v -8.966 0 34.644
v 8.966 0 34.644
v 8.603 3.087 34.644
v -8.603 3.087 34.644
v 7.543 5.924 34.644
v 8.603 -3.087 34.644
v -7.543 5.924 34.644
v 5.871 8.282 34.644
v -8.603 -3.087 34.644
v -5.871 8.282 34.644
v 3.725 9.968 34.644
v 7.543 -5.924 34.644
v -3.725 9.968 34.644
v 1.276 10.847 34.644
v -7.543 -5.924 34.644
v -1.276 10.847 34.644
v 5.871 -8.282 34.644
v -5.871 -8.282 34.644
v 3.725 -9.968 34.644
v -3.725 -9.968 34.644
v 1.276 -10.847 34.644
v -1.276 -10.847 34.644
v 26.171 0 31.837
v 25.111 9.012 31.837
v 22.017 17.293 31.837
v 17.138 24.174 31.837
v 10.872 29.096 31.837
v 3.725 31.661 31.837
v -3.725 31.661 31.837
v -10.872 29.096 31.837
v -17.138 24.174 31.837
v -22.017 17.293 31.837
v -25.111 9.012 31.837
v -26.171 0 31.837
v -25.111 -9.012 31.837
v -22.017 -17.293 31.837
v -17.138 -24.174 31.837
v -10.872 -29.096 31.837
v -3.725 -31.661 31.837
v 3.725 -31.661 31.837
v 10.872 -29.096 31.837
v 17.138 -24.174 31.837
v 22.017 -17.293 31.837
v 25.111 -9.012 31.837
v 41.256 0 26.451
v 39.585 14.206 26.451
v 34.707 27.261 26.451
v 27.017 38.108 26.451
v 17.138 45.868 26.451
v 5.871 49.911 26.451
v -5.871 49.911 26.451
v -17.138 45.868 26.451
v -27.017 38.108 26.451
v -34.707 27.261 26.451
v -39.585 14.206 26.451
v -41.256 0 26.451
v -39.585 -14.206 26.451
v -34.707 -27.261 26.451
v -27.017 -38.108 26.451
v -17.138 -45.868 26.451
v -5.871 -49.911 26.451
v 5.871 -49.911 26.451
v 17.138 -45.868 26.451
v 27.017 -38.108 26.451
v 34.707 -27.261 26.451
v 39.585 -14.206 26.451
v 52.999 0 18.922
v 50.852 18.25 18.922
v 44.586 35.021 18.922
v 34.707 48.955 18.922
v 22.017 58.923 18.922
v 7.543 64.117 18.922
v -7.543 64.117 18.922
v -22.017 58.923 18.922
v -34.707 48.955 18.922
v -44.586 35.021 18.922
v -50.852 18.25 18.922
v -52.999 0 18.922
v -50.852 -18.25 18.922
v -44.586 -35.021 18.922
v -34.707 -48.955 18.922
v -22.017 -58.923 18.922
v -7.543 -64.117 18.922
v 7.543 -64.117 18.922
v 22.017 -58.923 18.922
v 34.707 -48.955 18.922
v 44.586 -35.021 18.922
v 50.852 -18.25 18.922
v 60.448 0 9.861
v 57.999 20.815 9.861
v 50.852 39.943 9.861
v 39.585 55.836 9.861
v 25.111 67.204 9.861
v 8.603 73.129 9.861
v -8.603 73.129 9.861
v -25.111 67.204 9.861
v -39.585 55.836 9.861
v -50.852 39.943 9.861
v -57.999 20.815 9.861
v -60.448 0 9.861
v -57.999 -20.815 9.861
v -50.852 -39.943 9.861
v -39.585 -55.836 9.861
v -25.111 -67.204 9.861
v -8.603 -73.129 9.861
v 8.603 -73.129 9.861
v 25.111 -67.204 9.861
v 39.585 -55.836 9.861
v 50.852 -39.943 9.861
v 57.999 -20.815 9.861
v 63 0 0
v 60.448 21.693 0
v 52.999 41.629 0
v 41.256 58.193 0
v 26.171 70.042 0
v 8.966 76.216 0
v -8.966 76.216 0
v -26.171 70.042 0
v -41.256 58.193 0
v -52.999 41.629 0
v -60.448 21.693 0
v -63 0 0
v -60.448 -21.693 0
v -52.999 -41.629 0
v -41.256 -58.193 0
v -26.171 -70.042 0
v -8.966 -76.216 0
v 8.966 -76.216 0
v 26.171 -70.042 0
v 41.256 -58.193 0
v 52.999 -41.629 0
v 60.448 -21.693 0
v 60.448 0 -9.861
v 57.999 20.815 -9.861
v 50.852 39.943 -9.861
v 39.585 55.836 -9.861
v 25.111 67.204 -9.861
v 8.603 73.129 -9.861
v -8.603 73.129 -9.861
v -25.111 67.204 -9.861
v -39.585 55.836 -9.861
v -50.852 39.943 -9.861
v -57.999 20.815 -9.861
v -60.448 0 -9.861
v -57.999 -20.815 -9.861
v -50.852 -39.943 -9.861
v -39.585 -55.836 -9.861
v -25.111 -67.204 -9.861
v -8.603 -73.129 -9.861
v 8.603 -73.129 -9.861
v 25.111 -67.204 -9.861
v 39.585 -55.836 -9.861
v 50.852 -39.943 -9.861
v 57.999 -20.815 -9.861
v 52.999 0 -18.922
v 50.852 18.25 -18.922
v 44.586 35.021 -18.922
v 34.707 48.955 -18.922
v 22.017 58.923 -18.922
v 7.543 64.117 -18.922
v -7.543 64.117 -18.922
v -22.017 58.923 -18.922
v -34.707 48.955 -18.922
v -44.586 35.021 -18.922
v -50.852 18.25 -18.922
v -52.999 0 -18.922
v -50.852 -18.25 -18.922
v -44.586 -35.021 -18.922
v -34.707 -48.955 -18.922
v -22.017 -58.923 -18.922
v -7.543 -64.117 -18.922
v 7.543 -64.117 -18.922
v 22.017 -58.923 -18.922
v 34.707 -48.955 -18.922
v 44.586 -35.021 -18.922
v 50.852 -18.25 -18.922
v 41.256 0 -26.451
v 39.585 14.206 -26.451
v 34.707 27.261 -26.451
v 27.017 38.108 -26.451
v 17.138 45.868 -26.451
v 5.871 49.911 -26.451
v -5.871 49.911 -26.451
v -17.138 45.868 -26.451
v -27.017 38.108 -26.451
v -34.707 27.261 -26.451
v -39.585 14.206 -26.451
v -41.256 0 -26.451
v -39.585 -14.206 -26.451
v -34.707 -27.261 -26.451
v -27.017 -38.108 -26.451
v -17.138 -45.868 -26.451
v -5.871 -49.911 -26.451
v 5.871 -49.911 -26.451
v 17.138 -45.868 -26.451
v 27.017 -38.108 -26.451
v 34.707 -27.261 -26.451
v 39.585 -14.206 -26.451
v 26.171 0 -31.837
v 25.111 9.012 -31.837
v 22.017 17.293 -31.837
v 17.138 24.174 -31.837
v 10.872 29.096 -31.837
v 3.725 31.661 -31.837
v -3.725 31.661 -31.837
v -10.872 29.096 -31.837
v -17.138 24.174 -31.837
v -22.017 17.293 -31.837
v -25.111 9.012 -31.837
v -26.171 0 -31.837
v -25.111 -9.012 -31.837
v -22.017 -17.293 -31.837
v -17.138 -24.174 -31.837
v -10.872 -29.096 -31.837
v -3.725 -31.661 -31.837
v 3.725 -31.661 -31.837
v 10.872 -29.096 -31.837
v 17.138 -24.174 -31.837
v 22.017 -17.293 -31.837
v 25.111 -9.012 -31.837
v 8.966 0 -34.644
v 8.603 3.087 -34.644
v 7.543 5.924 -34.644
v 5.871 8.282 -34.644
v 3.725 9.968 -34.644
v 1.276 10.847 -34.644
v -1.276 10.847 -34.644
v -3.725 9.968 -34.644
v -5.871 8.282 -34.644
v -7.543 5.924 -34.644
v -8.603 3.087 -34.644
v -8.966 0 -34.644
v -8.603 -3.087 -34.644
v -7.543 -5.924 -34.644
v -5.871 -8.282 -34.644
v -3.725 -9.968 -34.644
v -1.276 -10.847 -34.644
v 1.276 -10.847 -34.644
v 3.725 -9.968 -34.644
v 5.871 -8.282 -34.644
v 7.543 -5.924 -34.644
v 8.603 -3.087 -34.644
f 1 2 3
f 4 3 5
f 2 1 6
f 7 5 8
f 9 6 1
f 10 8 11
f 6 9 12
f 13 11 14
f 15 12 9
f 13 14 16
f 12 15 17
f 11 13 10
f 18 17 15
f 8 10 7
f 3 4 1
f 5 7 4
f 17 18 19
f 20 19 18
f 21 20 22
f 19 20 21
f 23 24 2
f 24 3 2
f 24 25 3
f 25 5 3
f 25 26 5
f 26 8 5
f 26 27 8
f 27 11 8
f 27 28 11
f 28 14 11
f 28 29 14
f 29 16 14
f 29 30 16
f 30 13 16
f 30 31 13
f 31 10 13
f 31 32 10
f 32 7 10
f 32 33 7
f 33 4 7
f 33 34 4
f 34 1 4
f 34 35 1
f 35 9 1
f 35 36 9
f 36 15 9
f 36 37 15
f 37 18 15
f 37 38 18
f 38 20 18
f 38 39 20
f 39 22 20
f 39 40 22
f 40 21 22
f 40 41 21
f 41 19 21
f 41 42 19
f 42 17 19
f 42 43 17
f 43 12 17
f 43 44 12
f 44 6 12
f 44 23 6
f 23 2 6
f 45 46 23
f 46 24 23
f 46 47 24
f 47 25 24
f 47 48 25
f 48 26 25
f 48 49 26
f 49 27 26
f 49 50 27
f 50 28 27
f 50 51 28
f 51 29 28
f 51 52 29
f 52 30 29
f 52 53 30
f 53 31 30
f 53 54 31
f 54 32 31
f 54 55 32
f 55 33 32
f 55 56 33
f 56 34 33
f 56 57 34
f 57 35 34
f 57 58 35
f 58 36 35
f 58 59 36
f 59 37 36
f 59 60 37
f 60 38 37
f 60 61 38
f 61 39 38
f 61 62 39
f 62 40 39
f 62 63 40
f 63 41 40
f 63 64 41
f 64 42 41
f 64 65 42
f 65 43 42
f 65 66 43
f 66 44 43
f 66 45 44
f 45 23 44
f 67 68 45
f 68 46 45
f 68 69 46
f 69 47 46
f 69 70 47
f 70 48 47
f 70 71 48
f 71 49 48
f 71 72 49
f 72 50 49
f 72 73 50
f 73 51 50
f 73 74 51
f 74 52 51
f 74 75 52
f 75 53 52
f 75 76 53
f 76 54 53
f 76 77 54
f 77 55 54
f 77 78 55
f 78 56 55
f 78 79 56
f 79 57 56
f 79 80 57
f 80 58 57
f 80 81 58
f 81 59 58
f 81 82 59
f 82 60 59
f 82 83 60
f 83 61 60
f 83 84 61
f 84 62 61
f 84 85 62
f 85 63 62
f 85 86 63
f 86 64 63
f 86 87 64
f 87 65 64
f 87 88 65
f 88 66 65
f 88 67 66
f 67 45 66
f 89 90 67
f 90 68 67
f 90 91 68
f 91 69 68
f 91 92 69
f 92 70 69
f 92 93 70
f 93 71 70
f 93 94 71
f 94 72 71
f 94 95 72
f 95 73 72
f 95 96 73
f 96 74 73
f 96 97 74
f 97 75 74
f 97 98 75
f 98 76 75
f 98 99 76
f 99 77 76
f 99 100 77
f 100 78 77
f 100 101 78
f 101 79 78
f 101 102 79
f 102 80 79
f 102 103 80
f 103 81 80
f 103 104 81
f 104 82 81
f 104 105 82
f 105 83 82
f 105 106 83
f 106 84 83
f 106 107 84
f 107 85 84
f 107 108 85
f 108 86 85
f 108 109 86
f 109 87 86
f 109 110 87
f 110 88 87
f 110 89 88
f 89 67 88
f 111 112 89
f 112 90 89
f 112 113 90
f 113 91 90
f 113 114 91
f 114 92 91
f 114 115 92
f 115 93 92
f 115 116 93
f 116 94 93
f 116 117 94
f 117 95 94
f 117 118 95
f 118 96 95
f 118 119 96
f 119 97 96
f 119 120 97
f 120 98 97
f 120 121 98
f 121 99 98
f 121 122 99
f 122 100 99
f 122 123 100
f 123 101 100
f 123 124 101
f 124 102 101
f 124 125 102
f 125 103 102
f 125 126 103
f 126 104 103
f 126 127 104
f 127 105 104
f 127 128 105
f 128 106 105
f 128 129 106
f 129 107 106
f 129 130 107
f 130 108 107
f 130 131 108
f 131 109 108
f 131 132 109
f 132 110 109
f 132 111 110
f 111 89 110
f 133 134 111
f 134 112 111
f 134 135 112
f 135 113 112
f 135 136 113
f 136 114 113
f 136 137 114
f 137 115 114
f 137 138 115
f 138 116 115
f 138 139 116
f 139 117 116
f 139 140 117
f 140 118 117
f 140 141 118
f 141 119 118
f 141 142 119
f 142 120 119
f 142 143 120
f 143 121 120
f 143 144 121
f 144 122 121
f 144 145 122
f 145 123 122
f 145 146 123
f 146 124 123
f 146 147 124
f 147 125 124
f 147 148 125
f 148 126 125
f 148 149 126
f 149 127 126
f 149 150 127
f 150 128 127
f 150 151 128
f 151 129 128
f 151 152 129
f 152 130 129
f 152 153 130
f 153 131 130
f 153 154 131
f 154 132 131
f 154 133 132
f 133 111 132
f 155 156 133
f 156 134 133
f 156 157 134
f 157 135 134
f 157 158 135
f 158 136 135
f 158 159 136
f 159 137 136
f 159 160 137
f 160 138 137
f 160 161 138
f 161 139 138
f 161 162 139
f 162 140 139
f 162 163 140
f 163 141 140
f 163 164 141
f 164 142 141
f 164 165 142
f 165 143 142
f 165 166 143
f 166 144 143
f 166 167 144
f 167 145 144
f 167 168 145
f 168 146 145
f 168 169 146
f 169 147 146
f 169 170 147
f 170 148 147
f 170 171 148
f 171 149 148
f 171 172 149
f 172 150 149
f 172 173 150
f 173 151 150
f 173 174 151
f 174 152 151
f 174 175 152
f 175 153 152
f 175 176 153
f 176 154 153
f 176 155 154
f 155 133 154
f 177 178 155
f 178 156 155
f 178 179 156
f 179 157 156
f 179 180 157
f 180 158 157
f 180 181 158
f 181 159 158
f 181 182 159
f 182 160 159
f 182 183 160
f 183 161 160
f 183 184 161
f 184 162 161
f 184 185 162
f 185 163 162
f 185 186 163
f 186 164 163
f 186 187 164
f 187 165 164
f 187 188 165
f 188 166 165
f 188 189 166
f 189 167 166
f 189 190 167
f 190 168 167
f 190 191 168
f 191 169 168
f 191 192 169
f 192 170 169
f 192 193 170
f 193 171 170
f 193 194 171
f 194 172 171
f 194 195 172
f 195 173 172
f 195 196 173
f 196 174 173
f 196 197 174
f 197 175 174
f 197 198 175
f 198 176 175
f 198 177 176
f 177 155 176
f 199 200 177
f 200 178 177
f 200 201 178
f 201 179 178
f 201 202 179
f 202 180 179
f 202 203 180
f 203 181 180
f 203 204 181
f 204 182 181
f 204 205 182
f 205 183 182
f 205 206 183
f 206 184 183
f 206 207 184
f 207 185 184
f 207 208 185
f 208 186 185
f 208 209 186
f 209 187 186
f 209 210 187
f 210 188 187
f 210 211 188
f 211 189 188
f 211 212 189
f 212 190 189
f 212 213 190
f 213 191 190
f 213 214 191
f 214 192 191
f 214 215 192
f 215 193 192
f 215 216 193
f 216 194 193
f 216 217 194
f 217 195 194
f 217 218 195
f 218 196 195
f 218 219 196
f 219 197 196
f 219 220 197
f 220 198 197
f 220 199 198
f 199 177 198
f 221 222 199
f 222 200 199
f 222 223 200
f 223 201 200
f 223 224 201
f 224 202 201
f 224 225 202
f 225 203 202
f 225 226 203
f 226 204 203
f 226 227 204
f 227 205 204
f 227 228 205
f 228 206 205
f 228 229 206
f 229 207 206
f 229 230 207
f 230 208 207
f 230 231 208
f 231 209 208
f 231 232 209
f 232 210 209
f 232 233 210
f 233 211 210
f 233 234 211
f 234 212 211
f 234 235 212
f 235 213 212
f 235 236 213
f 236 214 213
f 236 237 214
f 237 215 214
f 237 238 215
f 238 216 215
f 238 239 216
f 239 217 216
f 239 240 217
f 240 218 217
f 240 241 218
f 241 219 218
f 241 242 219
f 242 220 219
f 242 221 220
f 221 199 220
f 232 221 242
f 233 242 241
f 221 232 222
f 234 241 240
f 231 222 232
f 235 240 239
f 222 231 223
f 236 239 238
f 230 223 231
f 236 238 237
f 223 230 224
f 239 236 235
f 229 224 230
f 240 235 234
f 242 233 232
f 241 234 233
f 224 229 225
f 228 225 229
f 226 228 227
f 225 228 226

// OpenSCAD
// Generated by SolidPython 1.0.1 on 2020-07-29 00:46:48


scale(v = [9, 11, 5]) {
	sphere(r = 7);
}
/***********************************************
*********      SolidPython code:      **********
************************************************
 
# import packages: SolidPython
from solid import *
from solid.utils import *
from itertools import chain, combinations, permutations


class Resize:

    def __init__(self, scad_file):
        self.scad_file = scad_file
        #self.scad_file = import_scad(scad_file)
        # cone/cylinder param:
        self.r1 = 0
        self.r2 = 0
        self.h = 0
        # rectangular prism param:
        self.w = 0
        self.l = 0
        # ellipse param:
        self.r = 0

    # import OpenScad code (file name corresponds to shape)


    # classify shape + parameters
    def assign(self, param1, param2, param3):
        if self.scad_file == 'cone.scad':
            self.r1 = param1
            self.r2 = param2
            self.h = param3
        elif self.scad_file == 'cylinder.scad':
            self.r1 = param1
            self.r2 = param2
            self.h = param3
        elif self.scad_file == 'rectangularPrism.scad':
            self.h = param1
            self.l = param2
            self.w = param3
        else:
            self.r = param1
            self.h = param2

    # resize parameters
    def iterate(self):
        x = range(3, 20, 2)
        i = 1
        if self.scad_file == 'cone.scad':
            tempList = list(permutations(x, 2))
            for temp in tempList:
                param1 = temp[0]
                param2 = temp[1]
                filepath = 'produced_scad_files/' + 'cone' + str(param1) + '_' + str(param2) + '_' + '.scad'
                scad_render_to_file(cylinder(h=param1, r1=param2, r2=0), filepath)

        elif self.scad_file == 'cylinder.scad':
            tempList = list(permutations(x, 3))
            for temp in tempList:
                param1 = temp[0]
                param2 = temp[1]
                filepath = 'produced_scad_files/' + 'cylinder' + str(param1) + '_' + str(param2) + '_' + '.scad'
                scad_render_to_file(cylinder(h=param1, r1=param2, r2=param2), filepath)

        elif self.scad_file == 'rectangularPrism.scad':
            tempList = list(permutations(x, 3))
            for temp in tempList:
                param1 = temp[0]
                param2 = temp[1]
                param3 = temp[2]
                filepath = 'produced_scad_files/' + 'rectangularPrism' + str(param1) + '_' + str(param2) + '_' + str(
                    param3) + '.scad'
                scad_render_to_file(cube(size=(param1, param2, param3)), filepath)

        elif self.scad_file == 'ellipse.scad':
            tempList = list(permutations(x, 4))
            for temp in tempList:
                param1 = temp[0]
                param2 = temp[1]
                param3 = temp[2]
                param4 = temp[3]
                filepath = 'produced_scad_files/' + 'ellipse' + str(param1) + '_' + str(param2) + '_' + str(param3) + '_' + str(param4) + '.scad'
                scad_render_to_file(scale([param1, param2, param3])(sphere(r=param4)), filepath)

    def render_to_scadfile(self):
        scad_render_to_file(scad, 'example.scad') 
 
************************************************/
